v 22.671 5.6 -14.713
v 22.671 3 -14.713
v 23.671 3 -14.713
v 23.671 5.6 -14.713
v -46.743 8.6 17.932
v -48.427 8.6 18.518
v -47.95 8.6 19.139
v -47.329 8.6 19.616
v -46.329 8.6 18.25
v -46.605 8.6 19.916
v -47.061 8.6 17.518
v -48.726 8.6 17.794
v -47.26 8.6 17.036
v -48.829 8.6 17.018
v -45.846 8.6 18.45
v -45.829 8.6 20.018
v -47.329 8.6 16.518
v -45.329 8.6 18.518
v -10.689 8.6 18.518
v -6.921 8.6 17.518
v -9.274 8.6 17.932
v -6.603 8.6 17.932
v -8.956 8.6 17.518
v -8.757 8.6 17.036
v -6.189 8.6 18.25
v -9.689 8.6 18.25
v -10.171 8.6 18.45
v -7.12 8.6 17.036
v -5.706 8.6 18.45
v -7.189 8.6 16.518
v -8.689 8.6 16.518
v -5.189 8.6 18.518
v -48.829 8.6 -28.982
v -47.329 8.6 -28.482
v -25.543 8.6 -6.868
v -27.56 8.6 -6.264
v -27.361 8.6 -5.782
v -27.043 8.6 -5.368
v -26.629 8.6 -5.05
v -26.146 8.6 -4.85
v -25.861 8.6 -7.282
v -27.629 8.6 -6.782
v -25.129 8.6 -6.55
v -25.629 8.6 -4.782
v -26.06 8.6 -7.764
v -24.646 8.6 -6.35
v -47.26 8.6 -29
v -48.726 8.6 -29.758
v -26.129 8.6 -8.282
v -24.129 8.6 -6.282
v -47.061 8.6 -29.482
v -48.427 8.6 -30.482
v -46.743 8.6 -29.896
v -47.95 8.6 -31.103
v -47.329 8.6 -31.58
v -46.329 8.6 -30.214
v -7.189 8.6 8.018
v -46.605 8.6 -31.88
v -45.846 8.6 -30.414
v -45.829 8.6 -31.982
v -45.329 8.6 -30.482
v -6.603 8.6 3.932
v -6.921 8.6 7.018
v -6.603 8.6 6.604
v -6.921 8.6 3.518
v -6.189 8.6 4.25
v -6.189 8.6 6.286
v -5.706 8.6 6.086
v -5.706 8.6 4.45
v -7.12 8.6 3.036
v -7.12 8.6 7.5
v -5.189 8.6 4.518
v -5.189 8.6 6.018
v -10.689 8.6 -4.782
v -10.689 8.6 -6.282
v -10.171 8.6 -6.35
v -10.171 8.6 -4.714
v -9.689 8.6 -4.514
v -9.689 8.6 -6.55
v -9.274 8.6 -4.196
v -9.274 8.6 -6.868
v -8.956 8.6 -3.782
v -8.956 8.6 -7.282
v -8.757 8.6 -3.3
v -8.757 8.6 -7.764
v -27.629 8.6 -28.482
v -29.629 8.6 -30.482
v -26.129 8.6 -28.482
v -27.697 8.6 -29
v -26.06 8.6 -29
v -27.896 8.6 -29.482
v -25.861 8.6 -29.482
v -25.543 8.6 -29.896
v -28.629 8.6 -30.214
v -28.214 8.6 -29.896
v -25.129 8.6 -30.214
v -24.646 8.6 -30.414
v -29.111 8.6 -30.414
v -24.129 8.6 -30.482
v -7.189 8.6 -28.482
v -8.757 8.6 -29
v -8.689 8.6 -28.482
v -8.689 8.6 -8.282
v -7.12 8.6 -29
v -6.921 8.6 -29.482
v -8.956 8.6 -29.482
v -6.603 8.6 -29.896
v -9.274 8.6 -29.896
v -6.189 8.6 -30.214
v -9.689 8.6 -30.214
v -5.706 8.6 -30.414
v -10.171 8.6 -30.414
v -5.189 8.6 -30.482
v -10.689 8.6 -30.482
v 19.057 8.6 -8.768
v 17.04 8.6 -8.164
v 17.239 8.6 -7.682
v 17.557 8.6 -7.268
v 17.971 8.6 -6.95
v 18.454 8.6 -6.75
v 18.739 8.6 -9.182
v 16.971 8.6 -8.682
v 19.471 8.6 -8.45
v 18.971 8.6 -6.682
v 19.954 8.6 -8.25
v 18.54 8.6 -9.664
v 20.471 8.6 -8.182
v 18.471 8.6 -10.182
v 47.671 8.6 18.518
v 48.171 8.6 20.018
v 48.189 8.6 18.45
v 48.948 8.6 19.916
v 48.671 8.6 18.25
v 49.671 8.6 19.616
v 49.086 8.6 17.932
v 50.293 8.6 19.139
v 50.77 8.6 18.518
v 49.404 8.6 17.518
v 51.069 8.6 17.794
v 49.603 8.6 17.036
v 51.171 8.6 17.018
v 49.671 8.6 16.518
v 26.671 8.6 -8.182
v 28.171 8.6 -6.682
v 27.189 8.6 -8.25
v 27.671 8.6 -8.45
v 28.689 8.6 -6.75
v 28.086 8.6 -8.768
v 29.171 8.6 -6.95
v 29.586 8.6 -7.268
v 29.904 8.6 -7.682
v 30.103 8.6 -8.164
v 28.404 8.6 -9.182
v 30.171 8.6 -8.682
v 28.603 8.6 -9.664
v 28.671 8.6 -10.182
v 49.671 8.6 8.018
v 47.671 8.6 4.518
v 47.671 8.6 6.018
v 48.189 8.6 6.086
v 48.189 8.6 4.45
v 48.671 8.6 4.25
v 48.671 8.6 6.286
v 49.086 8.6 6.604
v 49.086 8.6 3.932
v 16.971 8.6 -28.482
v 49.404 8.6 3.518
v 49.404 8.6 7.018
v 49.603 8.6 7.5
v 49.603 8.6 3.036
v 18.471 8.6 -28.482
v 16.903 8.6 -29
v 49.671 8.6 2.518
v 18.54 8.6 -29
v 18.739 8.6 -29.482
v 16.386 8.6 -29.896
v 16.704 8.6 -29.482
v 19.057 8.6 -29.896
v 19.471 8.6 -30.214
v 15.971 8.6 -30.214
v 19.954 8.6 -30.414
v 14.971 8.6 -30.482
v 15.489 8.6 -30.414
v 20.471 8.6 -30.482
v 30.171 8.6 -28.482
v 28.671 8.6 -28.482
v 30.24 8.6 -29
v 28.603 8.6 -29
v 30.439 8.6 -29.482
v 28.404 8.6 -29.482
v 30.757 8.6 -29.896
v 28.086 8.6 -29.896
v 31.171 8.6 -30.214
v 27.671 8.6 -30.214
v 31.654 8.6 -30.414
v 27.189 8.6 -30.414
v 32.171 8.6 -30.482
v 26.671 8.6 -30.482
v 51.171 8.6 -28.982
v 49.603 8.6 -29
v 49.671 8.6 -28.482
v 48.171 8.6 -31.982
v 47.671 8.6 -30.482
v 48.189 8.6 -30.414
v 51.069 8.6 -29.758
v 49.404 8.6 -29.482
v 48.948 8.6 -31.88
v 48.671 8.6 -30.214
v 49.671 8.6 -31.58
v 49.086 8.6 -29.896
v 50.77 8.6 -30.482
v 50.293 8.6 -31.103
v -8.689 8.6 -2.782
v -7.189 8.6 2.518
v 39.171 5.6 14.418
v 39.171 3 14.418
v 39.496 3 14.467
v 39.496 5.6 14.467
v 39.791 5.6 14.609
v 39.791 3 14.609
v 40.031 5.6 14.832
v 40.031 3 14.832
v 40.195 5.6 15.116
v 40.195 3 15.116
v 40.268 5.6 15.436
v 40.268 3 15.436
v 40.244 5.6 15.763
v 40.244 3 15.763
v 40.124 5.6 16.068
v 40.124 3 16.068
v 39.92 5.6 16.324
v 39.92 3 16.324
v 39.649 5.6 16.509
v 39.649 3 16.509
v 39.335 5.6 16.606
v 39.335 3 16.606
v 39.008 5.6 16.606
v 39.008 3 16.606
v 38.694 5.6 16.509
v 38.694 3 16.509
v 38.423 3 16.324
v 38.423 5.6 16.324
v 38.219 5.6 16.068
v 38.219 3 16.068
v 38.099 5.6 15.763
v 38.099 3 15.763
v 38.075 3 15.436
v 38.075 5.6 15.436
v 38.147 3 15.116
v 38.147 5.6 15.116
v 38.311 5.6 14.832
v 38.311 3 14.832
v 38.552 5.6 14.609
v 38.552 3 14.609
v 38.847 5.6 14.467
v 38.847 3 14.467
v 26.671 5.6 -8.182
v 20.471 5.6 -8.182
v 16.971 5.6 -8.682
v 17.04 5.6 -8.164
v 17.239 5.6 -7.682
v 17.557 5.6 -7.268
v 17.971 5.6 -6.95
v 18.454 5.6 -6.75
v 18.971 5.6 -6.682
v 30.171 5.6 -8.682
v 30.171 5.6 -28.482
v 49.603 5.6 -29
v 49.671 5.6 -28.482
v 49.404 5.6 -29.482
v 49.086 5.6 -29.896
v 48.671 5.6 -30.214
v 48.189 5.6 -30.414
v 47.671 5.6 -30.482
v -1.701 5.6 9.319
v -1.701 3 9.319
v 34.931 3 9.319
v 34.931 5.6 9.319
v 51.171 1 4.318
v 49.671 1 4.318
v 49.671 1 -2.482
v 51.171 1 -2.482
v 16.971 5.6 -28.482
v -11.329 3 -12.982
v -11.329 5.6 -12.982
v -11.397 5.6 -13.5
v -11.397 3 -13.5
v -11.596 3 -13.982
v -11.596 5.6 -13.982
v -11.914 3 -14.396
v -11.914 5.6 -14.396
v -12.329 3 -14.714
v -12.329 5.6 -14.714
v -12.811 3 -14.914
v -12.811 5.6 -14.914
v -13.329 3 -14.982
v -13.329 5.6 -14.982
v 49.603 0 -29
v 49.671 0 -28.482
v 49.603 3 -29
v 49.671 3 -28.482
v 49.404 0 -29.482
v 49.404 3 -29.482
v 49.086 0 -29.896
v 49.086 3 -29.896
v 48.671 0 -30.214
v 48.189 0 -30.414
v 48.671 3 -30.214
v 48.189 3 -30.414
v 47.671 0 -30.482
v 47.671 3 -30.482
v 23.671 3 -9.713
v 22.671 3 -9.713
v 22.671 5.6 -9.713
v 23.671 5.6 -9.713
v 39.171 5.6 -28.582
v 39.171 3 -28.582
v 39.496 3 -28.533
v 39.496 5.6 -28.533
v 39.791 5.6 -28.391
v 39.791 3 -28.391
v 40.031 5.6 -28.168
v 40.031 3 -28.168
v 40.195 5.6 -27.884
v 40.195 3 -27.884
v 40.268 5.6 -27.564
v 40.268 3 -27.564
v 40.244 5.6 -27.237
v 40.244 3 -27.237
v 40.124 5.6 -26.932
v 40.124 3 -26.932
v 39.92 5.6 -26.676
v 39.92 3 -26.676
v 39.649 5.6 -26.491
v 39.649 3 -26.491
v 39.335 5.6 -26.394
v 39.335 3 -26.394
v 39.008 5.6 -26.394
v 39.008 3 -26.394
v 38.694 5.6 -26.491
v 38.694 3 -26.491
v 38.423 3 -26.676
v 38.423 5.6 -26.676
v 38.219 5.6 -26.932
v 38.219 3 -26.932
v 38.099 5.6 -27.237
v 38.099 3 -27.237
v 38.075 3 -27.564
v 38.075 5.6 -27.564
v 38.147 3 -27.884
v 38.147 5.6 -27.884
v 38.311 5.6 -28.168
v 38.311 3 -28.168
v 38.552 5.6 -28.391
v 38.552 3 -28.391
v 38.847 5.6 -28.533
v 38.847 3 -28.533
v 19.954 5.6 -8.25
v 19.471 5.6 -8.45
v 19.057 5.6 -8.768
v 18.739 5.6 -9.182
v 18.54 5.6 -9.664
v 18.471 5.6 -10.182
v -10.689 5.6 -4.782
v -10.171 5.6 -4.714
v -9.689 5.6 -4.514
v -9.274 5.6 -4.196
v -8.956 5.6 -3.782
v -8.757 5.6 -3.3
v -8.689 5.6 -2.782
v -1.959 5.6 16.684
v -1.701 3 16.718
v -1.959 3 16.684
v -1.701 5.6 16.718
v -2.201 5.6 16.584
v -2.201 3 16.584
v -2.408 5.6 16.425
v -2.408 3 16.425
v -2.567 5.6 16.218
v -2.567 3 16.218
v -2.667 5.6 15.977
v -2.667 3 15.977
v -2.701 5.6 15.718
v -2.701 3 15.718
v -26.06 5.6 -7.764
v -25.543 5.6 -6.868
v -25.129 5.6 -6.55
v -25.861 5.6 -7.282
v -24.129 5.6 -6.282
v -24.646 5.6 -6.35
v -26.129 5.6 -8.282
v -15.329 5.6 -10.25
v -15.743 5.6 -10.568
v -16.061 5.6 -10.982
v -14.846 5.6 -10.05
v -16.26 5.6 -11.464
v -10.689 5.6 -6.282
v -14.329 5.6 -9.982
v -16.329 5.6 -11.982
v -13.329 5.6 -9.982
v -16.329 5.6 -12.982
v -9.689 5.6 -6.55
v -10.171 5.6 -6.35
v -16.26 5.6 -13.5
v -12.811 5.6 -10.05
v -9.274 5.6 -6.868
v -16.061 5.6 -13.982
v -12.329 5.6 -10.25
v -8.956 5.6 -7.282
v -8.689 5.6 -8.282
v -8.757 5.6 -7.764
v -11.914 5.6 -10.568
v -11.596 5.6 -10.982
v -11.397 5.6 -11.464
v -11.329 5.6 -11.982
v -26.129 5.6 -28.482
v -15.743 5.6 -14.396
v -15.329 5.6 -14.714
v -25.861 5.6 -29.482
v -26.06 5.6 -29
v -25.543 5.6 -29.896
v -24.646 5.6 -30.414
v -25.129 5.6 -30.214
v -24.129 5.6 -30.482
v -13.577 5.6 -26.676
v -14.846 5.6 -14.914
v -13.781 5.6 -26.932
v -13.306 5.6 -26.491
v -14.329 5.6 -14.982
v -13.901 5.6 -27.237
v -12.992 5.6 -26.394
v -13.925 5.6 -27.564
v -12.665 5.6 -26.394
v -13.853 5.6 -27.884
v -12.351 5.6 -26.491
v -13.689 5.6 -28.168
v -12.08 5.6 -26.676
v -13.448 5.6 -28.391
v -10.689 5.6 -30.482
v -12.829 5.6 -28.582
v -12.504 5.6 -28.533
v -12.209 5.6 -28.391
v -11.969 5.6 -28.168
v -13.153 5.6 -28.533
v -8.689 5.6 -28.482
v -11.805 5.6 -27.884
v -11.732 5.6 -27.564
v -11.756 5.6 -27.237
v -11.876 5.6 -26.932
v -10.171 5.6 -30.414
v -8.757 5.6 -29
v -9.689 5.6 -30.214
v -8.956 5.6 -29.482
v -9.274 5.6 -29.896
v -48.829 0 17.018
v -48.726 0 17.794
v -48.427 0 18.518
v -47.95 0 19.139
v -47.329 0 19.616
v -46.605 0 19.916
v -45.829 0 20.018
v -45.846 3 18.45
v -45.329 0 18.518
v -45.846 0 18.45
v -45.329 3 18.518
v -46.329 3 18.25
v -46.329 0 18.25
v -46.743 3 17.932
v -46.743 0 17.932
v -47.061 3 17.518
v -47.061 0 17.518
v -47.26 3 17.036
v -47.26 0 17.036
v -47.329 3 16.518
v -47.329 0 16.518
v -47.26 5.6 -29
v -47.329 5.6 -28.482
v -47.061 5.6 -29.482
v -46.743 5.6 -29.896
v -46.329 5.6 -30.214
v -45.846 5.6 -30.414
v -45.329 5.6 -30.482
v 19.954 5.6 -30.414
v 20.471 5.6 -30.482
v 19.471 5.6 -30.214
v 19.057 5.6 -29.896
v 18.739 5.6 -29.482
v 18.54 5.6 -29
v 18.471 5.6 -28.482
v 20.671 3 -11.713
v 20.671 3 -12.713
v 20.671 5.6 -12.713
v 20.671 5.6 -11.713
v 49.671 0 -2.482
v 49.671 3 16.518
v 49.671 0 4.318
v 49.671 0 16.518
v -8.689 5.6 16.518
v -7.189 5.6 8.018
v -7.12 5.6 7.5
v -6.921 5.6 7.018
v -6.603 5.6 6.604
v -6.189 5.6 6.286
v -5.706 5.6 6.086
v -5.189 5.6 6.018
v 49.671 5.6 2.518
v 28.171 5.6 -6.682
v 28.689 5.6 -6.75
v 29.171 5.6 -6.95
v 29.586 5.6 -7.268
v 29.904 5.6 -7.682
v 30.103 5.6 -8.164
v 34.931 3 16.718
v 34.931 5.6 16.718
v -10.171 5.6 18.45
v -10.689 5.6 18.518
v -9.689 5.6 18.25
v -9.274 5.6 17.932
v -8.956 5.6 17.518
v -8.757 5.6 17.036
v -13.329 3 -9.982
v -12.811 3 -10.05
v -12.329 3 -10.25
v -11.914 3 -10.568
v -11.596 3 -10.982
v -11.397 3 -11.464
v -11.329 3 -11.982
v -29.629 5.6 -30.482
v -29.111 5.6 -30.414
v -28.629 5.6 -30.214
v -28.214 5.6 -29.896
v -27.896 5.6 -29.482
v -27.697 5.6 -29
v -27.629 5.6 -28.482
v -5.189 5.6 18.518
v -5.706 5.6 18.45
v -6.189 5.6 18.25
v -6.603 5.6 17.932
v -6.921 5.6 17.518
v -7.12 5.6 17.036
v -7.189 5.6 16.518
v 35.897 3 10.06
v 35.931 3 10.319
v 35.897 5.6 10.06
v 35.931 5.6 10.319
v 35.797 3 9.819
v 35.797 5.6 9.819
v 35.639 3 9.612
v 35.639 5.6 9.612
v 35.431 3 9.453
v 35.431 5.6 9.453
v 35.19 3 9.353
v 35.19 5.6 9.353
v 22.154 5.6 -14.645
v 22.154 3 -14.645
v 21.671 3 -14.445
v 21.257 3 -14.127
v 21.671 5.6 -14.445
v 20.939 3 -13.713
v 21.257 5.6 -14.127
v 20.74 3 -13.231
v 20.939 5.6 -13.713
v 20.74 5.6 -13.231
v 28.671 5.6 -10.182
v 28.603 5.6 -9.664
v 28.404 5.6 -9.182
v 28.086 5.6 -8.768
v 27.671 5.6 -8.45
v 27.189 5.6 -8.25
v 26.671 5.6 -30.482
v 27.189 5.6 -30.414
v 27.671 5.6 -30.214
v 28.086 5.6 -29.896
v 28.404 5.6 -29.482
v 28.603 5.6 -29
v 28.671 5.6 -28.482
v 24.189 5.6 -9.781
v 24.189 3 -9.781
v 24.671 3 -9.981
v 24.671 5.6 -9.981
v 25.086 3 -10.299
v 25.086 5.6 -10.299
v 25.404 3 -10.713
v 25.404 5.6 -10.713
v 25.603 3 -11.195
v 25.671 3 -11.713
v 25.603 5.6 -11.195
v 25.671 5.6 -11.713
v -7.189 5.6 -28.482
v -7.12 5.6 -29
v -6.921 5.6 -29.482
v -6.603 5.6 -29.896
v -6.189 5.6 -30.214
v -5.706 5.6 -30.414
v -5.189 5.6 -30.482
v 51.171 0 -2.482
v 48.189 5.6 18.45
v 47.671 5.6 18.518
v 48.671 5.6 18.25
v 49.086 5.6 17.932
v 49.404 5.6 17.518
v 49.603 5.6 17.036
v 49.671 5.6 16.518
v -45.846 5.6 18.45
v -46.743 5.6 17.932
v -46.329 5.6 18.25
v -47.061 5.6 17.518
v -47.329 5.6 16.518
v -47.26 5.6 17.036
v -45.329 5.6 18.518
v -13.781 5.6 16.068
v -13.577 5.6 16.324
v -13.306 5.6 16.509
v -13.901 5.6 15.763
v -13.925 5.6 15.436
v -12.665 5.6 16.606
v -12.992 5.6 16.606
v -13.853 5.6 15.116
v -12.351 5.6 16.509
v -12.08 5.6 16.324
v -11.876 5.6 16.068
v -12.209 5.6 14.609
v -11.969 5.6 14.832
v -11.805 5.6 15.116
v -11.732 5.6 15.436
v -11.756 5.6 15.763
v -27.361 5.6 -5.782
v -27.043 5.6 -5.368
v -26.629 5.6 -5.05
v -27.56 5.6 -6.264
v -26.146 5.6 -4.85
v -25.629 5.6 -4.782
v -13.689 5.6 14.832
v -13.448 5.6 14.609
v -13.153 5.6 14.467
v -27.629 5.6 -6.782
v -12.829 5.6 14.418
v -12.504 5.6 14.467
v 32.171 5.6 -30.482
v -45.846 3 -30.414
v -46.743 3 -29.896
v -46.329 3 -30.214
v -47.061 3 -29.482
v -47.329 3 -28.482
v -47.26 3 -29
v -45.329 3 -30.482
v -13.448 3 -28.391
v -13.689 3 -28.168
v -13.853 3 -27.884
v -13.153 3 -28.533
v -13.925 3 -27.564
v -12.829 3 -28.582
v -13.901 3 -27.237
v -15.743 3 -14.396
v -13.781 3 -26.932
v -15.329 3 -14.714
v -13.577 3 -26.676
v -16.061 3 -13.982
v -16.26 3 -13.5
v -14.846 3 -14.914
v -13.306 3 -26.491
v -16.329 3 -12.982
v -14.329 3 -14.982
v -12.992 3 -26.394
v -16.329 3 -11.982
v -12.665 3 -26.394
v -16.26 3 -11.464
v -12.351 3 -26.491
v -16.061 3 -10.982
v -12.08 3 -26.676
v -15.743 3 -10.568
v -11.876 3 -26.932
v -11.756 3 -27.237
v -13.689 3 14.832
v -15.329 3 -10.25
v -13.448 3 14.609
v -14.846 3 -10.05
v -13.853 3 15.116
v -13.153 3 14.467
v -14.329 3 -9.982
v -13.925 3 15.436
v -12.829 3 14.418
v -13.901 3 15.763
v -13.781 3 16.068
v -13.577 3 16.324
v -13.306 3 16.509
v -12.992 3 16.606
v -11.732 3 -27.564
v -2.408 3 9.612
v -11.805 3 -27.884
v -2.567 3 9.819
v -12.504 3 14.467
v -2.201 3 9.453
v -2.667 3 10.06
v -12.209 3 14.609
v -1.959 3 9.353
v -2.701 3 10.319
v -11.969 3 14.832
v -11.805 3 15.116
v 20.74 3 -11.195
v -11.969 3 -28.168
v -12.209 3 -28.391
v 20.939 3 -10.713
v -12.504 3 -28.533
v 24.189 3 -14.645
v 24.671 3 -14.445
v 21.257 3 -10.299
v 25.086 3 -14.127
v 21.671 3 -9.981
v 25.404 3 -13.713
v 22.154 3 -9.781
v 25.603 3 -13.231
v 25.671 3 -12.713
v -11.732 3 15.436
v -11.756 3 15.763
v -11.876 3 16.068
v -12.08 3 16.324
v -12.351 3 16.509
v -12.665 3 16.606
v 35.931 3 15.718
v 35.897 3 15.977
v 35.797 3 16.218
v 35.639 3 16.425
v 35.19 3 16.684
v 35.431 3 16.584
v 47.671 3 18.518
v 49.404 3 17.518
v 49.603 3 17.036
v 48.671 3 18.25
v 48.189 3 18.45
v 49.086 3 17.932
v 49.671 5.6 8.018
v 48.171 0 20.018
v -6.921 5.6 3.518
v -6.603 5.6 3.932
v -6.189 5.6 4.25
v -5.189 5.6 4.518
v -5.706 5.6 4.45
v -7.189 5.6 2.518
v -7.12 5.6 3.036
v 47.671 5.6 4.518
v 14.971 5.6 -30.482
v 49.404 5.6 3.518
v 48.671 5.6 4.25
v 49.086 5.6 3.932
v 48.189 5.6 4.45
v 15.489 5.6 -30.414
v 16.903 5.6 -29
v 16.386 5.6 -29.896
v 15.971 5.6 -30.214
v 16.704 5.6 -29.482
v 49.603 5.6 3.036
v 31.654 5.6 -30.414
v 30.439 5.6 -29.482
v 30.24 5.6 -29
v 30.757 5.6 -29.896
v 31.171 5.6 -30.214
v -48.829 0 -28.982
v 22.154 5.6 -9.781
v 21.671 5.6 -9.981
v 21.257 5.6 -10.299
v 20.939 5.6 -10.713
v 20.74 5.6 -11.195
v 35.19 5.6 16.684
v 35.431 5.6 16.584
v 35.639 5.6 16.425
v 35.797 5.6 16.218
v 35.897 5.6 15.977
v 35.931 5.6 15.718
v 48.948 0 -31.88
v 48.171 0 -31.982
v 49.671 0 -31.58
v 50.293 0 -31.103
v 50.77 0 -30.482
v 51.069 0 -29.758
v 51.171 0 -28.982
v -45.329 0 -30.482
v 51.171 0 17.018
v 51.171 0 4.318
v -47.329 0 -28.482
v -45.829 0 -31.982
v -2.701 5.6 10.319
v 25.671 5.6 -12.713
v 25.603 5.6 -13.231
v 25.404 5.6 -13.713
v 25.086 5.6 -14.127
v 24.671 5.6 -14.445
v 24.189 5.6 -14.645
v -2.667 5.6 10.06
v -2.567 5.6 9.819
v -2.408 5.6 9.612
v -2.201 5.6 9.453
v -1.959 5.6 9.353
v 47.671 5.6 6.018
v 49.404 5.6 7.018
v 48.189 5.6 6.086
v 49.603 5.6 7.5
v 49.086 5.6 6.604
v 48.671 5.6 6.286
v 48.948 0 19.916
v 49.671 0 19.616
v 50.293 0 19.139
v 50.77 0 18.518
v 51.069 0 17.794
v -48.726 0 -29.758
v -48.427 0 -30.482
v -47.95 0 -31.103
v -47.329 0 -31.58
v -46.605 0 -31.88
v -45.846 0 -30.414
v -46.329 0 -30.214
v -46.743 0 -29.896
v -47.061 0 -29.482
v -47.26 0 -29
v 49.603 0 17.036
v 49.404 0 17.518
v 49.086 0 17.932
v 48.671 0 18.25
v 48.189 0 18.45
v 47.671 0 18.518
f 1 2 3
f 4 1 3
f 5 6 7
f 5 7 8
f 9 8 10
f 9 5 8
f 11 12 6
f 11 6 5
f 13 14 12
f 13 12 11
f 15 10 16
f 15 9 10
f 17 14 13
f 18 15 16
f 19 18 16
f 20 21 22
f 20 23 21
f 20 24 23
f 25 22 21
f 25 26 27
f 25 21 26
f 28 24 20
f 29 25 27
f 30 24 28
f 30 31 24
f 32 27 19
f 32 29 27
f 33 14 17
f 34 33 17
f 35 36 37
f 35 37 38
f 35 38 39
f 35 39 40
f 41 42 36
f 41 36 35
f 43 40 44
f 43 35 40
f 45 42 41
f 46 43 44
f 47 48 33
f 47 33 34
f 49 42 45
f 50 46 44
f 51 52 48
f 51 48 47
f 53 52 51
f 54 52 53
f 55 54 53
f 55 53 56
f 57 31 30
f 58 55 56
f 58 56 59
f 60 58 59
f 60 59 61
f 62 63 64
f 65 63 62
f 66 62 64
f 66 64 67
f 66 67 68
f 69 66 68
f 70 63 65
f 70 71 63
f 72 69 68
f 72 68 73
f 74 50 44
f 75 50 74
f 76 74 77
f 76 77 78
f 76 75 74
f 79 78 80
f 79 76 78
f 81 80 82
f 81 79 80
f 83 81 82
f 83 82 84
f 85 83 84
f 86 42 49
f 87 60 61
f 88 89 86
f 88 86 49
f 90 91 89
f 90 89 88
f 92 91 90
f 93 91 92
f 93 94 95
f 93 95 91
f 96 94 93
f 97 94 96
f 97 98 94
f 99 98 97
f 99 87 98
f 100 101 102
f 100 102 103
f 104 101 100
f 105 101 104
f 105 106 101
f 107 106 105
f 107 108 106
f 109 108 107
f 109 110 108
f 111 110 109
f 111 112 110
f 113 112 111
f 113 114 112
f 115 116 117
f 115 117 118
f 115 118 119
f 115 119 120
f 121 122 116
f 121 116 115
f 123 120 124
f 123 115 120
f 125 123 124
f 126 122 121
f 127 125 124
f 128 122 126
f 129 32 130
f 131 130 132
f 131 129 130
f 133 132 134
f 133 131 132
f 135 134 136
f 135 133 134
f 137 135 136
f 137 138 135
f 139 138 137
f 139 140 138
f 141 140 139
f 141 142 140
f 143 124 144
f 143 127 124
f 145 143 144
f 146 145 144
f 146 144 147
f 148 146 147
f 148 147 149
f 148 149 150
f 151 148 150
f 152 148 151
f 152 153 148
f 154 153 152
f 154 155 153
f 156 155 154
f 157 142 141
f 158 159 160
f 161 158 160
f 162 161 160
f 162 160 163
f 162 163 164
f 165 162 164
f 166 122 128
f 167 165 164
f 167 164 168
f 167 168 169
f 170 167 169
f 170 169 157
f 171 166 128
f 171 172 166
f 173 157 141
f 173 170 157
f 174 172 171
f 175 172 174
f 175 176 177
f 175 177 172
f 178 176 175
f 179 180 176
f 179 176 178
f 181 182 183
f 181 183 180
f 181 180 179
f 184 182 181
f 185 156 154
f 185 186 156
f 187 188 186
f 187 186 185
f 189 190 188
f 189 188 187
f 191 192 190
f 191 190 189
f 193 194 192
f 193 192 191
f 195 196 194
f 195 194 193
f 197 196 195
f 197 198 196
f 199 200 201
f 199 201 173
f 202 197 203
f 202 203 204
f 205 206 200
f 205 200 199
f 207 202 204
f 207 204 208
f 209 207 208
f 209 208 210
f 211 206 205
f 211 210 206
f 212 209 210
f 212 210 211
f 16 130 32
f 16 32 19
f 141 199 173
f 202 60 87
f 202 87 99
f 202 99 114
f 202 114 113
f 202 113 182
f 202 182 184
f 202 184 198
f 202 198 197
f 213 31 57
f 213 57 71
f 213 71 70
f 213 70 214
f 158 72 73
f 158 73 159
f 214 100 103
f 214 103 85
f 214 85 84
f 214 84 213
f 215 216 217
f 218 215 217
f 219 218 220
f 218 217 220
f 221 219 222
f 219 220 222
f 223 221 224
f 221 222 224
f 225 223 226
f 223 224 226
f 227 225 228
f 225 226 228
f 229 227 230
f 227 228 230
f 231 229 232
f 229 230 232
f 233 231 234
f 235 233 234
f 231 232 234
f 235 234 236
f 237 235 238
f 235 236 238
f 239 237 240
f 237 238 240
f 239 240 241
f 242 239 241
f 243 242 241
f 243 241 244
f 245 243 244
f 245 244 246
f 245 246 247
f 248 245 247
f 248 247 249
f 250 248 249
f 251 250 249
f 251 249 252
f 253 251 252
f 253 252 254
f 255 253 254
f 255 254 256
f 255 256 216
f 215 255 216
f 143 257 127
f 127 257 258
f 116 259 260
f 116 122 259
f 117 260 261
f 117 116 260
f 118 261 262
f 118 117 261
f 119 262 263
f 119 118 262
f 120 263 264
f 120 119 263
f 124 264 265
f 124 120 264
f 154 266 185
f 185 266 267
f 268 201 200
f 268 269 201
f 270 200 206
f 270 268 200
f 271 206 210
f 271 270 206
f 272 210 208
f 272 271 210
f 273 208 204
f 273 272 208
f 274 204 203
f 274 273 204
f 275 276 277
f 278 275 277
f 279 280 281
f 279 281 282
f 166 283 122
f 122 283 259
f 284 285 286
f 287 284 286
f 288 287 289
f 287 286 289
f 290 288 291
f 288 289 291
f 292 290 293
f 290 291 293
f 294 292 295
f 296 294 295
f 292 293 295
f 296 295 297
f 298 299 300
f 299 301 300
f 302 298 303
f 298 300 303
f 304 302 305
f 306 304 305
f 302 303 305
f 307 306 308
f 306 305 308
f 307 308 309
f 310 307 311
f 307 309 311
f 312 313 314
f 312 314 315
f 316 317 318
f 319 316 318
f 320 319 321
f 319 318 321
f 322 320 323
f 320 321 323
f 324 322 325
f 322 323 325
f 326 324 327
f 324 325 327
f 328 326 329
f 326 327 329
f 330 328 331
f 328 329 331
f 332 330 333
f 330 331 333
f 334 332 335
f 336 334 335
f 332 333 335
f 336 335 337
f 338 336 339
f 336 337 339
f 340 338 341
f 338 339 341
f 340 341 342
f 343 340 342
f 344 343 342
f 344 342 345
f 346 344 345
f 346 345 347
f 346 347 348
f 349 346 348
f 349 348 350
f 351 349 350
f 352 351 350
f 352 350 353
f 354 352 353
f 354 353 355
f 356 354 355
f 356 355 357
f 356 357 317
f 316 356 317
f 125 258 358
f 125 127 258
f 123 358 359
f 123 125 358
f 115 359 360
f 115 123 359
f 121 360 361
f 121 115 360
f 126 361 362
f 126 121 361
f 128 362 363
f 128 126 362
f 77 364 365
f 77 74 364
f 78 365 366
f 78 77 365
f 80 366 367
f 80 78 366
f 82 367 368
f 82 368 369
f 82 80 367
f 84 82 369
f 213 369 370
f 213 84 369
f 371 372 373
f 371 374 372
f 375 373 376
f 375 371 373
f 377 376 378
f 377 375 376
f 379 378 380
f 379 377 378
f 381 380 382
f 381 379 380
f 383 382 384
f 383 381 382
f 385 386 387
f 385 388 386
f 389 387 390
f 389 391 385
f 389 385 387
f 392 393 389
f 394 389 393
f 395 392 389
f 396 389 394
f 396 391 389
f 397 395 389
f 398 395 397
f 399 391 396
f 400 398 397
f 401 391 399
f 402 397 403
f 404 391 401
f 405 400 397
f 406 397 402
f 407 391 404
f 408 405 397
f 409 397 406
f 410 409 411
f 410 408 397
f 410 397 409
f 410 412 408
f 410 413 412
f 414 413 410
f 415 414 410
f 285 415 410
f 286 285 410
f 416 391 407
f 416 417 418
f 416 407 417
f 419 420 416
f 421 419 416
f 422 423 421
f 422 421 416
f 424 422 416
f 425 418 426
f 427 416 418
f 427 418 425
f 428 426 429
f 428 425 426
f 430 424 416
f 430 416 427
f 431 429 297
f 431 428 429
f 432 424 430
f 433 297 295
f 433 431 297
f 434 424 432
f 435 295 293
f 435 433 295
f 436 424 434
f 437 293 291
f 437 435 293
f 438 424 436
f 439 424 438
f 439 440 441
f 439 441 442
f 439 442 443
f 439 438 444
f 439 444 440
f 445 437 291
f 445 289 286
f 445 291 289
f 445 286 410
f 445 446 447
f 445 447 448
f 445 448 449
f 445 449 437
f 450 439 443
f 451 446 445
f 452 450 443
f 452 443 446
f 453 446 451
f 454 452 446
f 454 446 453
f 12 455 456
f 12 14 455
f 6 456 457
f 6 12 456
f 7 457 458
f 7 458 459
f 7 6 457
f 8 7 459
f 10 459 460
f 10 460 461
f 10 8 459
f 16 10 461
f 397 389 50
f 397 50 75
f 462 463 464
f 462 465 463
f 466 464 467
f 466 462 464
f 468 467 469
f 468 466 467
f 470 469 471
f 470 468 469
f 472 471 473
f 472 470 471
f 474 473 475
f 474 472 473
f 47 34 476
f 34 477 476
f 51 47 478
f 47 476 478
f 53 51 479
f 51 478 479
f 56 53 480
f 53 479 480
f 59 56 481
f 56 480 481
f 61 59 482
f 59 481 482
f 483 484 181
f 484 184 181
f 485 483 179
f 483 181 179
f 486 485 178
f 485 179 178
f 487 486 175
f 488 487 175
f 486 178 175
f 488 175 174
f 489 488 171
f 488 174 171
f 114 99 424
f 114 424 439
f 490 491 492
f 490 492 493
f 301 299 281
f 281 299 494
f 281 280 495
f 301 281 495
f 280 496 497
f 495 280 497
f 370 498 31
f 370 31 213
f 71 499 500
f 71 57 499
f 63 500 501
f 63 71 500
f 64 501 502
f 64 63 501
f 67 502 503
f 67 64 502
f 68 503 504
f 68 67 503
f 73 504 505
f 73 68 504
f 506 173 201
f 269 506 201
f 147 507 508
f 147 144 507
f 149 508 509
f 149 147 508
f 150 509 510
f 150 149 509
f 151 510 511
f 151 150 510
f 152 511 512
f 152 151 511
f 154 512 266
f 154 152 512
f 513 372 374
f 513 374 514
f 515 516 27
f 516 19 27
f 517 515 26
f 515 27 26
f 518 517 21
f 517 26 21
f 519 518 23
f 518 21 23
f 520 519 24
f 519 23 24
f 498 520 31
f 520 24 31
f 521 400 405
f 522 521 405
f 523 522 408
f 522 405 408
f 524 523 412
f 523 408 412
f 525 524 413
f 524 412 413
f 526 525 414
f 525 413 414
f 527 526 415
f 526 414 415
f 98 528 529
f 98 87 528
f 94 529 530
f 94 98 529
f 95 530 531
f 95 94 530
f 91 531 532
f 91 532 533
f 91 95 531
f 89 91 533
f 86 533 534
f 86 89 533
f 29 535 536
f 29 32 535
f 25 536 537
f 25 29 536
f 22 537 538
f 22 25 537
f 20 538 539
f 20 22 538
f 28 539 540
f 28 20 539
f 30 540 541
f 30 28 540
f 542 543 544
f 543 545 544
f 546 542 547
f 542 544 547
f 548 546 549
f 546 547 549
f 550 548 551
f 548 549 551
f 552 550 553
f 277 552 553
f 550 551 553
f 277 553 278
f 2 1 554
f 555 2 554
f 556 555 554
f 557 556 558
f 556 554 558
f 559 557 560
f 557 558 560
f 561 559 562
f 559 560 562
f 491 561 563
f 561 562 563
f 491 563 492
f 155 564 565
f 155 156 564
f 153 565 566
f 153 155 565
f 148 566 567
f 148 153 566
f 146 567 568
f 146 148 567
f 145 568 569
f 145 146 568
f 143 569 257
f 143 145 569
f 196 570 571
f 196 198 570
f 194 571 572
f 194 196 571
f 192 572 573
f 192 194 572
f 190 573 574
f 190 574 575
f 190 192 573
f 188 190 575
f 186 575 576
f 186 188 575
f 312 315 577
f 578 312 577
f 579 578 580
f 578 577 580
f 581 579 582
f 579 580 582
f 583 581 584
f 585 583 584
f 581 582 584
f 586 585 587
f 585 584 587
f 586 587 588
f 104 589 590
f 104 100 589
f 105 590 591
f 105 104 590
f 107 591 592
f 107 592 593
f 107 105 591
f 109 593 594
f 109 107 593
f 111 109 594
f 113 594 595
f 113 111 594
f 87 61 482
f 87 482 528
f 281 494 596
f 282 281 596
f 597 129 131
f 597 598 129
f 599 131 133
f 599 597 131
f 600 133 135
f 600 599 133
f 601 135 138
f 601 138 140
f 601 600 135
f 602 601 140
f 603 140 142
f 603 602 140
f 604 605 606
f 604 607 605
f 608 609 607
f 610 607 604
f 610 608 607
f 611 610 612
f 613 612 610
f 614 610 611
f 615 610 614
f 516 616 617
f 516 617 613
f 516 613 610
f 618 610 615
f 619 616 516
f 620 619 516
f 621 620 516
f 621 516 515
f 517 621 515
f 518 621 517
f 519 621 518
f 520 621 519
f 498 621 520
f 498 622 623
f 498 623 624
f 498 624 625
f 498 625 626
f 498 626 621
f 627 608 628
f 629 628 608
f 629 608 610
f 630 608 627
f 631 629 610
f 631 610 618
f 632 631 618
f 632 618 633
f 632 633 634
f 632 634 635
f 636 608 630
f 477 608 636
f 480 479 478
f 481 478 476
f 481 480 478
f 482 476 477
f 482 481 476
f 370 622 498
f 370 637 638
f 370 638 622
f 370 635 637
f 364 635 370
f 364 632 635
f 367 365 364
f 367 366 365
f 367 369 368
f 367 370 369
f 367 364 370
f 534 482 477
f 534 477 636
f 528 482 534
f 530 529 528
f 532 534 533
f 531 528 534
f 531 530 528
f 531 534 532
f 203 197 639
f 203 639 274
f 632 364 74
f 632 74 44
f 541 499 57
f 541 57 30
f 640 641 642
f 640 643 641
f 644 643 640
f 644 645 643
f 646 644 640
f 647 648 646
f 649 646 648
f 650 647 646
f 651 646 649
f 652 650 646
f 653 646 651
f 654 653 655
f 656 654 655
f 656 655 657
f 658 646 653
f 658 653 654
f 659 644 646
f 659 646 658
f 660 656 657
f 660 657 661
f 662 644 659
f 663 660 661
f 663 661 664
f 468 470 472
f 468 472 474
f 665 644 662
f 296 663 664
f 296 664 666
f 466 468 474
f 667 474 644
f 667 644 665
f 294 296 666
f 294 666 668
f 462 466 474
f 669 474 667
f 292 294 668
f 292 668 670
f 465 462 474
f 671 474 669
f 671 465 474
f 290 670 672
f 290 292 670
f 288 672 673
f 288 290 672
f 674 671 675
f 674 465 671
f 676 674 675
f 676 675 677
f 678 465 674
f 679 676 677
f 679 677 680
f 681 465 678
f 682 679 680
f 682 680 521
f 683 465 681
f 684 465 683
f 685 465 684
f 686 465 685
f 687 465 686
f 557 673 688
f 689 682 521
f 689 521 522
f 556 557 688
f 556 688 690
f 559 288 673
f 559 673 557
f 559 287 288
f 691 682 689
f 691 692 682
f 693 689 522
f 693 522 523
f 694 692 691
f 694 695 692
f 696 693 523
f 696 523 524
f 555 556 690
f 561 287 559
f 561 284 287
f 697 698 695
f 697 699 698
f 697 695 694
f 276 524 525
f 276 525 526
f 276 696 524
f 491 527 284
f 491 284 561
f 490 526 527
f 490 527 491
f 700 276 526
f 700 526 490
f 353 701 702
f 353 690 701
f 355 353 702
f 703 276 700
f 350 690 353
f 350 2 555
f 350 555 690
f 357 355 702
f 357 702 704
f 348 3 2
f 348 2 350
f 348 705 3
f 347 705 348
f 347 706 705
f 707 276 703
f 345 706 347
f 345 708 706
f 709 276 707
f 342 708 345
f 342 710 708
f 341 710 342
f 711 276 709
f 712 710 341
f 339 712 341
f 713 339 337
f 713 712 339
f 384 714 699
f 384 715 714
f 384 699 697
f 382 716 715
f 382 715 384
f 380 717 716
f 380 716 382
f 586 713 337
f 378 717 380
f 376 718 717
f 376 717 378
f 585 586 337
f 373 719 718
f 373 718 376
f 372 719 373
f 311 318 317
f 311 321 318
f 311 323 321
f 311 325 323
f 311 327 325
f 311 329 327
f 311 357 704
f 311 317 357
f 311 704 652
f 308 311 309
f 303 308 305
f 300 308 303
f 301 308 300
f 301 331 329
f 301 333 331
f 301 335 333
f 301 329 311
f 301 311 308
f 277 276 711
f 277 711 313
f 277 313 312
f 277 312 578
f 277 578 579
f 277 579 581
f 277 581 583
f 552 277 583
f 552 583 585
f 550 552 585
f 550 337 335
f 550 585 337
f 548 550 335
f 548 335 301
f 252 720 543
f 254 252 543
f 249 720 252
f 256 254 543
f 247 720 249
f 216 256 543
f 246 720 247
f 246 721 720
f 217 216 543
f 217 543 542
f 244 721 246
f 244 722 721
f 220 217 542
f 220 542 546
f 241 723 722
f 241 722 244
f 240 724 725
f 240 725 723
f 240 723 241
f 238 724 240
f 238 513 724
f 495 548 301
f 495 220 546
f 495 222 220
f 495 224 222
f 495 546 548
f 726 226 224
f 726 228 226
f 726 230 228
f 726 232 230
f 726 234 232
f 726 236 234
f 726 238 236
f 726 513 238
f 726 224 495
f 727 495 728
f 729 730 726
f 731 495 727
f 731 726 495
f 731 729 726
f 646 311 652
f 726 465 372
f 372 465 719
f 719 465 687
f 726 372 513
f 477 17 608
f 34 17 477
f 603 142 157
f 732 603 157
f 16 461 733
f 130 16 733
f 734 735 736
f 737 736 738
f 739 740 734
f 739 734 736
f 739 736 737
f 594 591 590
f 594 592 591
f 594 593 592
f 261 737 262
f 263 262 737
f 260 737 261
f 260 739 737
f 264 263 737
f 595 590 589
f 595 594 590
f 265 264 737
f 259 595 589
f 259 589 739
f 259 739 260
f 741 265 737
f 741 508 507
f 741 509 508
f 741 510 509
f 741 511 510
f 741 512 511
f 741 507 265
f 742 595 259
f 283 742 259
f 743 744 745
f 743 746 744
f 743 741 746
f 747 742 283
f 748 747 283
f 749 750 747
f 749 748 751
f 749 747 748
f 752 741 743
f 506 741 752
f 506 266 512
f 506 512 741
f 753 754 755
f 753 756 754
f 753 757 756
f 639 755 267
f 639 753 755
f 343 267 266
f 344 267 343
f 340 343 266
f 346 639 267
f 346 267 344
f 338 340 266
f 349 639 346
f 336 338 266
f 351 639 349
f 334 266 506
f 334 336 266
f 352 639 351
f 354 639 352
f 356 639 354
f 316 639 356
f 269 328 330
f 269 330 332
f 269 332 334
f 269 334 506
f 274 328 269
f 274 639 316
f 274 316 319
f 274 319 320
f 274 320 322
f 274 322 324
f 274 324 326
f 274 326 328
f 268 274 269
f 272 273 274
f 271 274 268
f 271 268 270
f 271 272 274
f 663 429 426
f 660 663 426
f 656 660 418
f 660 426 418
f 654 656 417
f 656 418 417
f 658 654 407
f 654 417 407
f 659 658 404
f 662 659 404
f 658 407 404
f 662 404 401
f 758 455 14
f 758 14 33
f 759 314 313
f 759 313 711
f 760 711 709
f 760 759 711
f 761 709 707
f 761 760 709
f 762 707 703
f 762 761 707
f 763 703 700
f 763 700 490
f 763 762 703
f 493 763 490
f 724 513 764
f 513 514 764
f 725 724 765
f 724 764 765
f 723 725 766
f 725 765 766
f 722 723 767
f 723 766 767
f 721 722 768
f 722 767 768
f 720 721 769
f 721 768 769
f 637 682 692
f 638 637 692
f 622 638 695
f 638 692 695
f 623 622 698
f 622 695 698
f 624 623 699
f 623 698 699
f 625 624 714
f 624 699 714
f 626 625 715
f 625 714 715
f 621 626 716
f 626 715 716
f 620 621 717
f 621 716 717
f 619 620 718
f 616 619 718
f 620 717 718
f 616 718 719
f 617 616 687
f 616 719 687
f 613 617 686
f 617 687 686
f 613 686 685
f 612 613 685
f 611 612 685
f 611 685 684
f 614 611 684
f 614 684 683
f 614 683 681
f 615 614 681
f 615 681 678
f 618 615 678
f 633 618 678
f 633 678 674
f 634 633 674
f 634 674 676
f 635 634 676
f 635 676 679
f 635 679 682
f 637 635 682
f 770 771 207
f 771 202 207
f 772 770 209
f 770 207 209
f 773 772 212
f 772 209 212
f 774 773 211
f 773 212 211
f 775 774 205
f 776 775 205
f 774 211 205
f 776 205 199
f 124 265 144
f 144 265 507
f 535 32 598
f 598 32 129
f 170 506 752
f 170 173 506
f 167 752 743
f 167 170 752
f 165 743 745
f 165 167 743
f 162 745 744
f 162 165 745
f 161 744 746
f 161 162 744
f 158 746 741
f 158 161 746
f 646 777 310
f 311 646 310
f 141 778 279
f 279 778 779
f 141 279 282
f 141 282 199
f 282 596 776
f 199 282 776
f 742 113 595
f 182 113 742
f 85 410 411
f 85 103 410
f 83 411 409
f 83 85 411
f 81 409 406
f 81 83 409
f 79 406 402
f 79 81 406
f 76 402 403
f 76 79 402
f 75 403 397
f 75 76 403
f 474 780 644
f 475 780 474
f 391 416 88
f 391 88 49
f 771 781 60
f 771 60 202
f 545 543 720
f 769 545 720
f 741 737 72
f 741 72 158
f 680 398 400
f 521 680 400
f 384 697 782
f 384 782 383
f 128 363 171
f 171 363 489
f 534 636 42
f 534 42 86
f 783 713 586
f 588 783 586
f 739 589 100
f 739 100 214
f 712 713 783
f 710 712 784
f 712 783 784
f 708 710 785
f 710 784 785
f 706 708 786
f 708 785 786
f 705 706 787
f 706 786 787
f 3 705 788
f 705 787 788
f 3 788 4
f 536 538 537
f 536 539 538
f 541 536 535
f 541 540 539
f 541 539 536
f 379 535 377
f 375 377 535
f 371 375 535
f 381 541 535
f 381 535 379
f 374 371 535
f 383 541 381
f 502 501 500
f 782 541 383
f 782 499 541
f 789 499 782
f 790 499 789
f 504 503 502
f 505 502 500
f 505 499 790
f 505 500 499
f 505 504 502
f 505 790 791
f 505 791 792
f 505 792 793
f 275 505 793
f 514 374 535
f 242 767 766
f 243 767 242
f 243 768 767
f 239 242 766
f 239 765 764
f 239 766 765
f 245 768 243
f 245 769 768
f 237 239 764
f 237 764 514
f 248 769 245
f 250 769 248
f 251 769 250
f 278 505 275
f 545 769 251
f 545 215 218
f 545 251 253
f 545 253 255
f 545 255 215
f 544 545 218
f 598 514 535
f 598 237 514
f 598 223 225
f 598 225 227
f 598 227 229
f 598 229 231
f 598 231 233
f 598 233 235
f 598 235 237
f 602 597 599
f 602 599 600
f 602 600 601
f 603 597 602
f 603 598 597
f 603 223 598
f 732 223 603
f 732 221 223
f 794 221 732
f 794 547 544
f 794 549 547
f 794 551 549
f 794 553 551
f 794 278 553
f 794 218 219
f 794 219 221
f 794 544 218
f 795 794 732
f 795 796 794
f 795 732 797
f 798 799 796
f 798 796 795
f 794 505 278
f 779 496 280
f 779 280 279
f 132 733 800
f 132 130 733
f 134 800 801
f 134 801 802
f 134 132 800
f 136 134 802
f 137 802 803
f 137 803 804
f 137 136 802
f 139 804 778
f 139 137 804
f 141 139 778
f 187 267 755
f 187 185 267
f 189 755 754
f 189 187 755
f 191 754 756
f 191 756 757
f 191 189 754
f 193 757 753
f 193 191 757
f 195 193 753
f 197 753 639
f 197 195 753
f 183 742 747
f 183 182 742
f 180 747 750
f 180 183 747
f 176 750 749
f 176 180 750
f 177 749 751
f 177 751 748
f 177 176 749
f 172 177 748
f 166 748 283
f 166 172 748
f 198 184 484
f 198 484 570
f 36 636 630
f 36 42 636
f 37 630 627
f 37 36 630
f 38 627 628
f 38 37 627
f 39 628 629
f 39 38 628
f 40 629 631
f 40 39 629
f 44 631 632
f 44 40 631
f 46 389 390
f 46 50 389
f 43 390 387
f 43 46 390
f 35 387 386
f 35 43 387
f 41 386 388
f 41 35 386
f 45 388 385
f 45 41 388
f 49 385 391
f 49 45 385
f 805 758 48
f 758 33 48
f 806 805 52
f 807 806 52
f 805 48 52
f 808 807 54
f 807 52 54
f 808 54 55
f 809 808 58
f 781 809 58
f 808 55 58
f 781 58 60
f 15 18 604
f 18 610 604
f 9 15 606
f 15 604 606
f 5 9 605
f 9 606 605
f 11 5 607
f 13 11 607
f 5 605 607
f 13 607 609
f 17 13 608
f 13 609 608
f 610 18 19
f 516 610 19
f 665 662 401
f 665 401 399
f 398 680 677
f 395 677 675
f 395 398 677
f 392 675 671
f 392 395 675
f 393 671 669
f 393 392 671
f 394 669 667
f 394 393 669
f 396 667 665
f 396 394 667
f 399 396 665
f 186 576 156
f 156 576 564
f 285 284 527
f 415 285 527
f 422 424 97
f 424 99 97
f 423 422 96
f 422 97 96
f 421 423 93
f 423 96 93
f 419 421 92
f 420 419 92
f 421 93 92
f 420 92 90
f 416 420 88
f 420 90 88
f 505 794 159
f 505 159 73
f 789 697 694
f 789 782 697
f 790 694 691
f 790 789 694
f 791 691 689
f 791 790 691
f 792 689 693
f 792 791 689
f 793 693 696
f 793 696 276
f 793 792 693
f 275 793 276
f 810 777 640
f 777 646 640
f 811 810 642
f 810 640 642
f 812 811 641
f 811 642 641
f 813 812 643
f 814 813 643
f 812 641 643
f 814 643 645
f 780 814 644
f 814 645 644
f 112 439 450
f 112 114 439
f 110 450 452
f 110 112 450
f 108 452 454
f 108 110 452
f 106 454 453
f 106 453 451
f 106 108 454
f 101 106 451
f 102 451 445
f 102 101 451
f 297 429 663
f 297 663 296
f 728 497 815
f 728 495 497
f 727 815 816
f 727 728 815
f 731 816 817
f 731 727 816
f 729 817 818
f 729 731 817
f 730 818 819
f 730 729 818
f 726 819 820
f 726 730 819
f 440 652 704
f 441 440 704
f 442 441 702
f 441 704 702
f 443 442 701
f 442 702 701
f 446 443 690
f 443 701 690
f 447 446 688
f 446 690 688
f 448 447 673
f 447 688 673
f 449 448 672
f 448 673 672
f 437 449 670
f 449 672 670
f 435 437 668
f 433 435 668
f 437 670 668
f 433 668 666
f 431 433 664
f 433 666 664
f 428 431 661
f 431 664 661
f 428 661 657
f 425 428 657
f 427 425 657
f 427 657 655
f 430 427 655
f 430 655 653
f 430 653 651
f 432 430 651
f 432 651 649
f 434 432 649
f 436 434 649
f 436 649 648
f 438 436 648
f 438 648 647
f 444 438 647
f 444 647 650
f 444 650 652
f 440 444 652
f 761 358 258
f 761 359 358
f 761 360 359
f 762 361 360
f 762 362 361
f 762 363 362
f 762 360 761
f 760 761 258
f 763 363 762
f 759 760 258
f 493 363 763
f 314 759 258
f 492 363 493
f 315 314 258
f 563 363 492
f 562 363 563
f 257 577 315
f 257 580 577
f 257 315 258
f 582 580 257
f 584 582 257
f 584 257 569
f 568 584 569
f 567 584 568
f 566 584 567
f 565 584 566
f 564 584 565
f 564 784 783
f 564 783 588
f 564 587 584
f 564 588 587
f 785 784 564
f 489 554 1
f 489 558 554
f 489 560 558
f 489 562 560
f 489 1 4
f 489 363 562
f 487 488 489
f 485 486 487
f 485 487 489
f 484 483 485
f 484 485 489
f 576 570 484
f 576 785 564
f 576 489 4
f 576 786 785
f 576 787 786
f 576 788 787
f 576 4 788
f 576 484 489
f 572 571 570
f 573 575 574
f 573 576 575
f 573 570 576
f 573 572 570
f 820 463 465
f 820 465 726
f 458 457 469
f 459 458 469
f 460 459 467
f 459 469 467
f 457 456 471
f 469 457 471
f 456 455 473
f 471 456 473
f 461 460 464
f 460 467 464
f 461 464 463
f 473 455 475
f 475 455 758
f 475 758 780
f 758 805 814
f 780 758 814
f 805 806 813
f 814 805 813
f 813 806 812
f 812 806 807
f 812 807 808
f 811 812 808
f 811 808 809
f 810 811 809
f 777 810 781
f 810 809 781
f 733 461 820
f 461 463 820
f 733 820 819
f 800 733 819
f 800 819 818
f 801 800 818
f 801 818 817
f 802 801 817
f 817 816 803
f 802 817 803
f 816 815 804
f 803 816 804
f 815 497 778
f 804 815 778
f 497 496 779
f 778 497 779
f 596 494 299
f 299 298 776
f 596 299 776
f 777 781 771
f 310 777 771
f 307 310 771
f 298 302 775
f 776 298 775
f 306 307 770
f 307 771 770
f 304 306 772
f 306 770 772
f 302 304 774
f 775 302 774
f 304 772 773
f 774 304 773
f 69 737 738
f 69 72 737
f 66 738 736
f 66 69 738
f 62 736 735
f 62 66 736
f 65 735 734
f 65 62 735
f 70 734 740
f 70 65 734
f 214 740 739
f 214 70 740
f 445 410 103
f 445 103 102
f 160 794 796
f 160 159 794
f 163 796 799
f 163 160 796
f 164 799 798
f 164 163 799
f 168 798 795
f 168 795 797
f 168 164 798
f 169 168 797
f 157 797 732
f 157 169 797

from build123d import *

# Parameters (mm, degrees)
SKETCH_1_W          = 100
SKETCH_1_H          = 52
EXTRUDE_1_DEPTH     = 8.6
SKETCH_2_W          = 97
SKETCH_2_H          = 49
CUT_EXTRUDE_1_DEPTH = 3
SKETCH_3_R          = 1.1
SKETCH_3_W          = 38.632034186
SKETCH_3_H          = 7.399361665
SKETCH_3_W_2        = 5
SKETCH_3_H_2        = 5
CUT_EXTRUDE_2_DEPTH = 61.603041755
FILLET_1_R          = 2
SKETCH_4_W          = 1.5
SKETCH_4_H          = 6.8
CUT_EXTRUDE_3_DEPTH = 1
SKETCH_5_W          = 97
SKETCH_5_H          = 49
CUT_EXTRUDE_4_DEPTH = 3
EXTRUDE_2_DEPTH     = 3
FILLET_2_R          = 3
FILLET_3_R          = 2
FILLET_5_R          = 1


with BuildPart() as part:
    # 草图1 → 凸台-拉伸1 (new body)
    with BuildSketch(Plane(origin=(0, 0, 0), x_dir=(1, 0, 0), z_dir=(0, 1, 0))):
        with Locations((1.17145908, 5.982033169)):
            Rectangle(SKETCH_1_W, SKETCH_1_H)
    extrude(amount=EXTRUDE_1_DEPTH)

    # 草图2 → 切除-拉伸1 (cut)
    with BuildSketch(Plane.XZ):
        with Locations((1.17145908, -5.982033169)):
            Rectangle(SKETCH_2_W, SKETCH_2_H)
    extrude(amount=-CUT_EXTRUDE_1_DEPTH, mode=Mode.SUBTRACT)

    # 草图3 → 切除-拉伸2 (cut, through all)
    with BuildSketch(Plane.XZ.offset(-3)):
        with Locations(Location((-12.82854092, 15.517966831, 0), (0, 0, 270))):
            Circle(SKETCH_3_R)
        with Locations(Location((39.17145908, 15.517966831, 0), (0, 0, 270))):
            Circle(SKETCH_3_R)
        with Locations(Location((39.17145908, -27.482033169, 0), (0, 0, 270))):
            Circle(SKETCH_3_R)
        with Locations(Location((-12.82854092, -27.482033169, 0), (0, 0, 270))):
            Circle(SKETCH_3_R)
        with Locations((16.615396969, 13.018709543)):
            Rectangle(SKETCH_3_W, SKETCH_3_H)
        with Locations((-13.82854092, -12.482033169)):
            Rectangle(SKETCH_3_W_2, SKETCH_3_H_2)
        with Locations((23.17145908, -12.21289677)):
            Rectangle(SKETCH_3_W_2, SKETCH_3_H_2)
    extrude(amount=-CUT_EXTRUDE_2_DEPTH, mode=Mode.SUBTRACT)

    # 圆角1
    fillet_1_edges = [part.edges().sort_by_distance(p)[0] for p in [
        (20.67145908, 5.8, -14.71289677),
        (20.67145908, 5.8, -9.71289677),
        (25.67145908, 5.8, -9.71289677),
        (25.67145908, 5.8, -14.71289677),
        (-16.32854092, 5.8, -14.982033169),
        (-16.32854092, 5.8, -9.982033169),
        (-11.32854092, 5.8, -9.982033169),
        (-11.32854092, 5.8, -14.982033169),
    ]]
    fillet(fillet_1_edges, radius=FILLET_1_R)

    # 草图4 → 切除-拉伸3 (cut)
    with BuildSketch(Plane.XZ):
        with Locations((50.42145908, 0.917966831)):
            Rectangle(SKETCH_4_W, SKETCH_4_H)
    extrude(amount=-CUT_EXTRUDE_3_DEPTH, mode=Mode.SUBTRACT)

    # 草图5 → 切除-拉伸4 (cut)
    with BuildSketch(Plane(origin=(0, 8.6, 0), x_dir=(1, 0, 0), z_dir=(0, 1, 0))):
        with Locations((1.17145908, 5.982033169)):
            Rectangle(SKETCH_5_W, SKETCH_5_H)
    extrude(amount=-CUT_EXTRUDE_4_DEPTH, mode=Mode.SUBTRACT)

    # 草图7 → 凸台-拉伸2 (add, through all)
    with BuildSketch(Plane(origin=(0, 5.6, 0), x_dir=(1, 0, 0), z_dir=(0, 1, 0))):
        Polygon((-8.68854092, -18.517966831), (-8.68854092, 4.782033169), (-27.62854092, 4.782033169), (-27.62854092, 30.482033169), (-26.12854092, 30.482033169), (-26.12854092, 6.282033169), (-8.68854092, 6.282033169), (-8.68854092, 30.482033169), (-7.18854092, 30.482033169), (-7.18854092, -4.517966831), (49.67145908, -4.517966831), (49.67145908, -6.017966831), (-7.18854092, -6.017966831), (-7.18854092, -18.517966831), align=None)
        Polygon((16.97145908, 30.482033169), (16.97145908, 6.682033169), (30.17145908, 6.682033169), (30.17145908, 30.482033169), (28.67145908, 30.482033169), (28.67145908, 8.182033169), (18.47145908, 8.182033169), (18.47145908, 30.482033169), align=None)
    extrude(amount=EXTRUDE_2_DEPTH)

    # 圆角2
    fillet_2_edges = [part.edges().sort_by_distance(p)[0] for p in [
        (-48.82854092, 4.3, -31.982033169),
        (51.17145908, 4.3, -31.982033169),
        (51.17145908, 4.3, 20.017966831),
        (-48.82854092, 4.3, 20.017966831),
    ]]
    fillet(fillet_2_edges, radius=FILLET_2_R)

    # 圆角3
    fillet_3_edges = [part.edges().sort_by_distance(p)[0] for p in [
        (49.67145908, 1.5, 18.517966831),
        (49.67145908, 1.5, -30.482033169),
        (-47.32854092, 1.5, -30.482033169),
        (-47.32854092, 1.5, 18.517966831),
        (-47.32854092, 7.1, 18.517966831),
        (-47.32854092, 7.1, -30.482033169),
        (49.67145908, 7.1, -30.482033169),
        (49.67145908, 7.1, 18.517966831),
        (-8.68854092, 7.1, 18.517966831),
        (-7.18854092, 7.1, 18.517966831),
        (-7.18854092, 7.1, 6.017966831),
        (49.67145908, 7.1, 6.017966831),
        (49.67145908, 7.1, 4.517966831),
        (-7.18854092, 7.1, 4.517966831),
        (-7.18854092, 7.1, -30.482033169),
        (-8.68854092, 7.1, -30.482033169),
        (-8.68854092, 7.1, -6.282033169),
        (-26.12854092, 7.1, -6.282033169),
        (-26.12854092, 7.1, -30.482033169),
        (-27.62854092, 7.1, -30.482033169),
        (-27.62854092, 7.1, -4.782033169),
        (-8.68854092, 7.1, -4.782033169),
        (18.47145908, 7.1, -30.482033169),
        (16.97145908, 7.1, -30.482033169),
        (16.97145908, 7.1, -6.682033169),
        (30.17145908, 7.1, -6.682033169),
        (30.17145908, 7.1, -30.482033169),
        (28.67145908, 7.1, -30.482033169),
        (28.67145908, 7.1, -8.182033169),
        (18.47145908, 7.1, -8.182033169),
    ]]
    fillet(fillet_3_edges, radius=FILLET_3_R)

    # 圆角5
    fillet_5_edges = [part.edges().sort_by_distance(p)[0] for p in [
        (-2.700620124, 4.3, 16.718390375),
        (35.931414062, 4.3, 16.718390375),
        (-2.700620124, 4.3, 9.31902871),
        (35.931414062, 4.3, 9.31902871),
    ]]
    fillet(fillet_5_edges, radius=FILLET_5_R)


solid = part.part
